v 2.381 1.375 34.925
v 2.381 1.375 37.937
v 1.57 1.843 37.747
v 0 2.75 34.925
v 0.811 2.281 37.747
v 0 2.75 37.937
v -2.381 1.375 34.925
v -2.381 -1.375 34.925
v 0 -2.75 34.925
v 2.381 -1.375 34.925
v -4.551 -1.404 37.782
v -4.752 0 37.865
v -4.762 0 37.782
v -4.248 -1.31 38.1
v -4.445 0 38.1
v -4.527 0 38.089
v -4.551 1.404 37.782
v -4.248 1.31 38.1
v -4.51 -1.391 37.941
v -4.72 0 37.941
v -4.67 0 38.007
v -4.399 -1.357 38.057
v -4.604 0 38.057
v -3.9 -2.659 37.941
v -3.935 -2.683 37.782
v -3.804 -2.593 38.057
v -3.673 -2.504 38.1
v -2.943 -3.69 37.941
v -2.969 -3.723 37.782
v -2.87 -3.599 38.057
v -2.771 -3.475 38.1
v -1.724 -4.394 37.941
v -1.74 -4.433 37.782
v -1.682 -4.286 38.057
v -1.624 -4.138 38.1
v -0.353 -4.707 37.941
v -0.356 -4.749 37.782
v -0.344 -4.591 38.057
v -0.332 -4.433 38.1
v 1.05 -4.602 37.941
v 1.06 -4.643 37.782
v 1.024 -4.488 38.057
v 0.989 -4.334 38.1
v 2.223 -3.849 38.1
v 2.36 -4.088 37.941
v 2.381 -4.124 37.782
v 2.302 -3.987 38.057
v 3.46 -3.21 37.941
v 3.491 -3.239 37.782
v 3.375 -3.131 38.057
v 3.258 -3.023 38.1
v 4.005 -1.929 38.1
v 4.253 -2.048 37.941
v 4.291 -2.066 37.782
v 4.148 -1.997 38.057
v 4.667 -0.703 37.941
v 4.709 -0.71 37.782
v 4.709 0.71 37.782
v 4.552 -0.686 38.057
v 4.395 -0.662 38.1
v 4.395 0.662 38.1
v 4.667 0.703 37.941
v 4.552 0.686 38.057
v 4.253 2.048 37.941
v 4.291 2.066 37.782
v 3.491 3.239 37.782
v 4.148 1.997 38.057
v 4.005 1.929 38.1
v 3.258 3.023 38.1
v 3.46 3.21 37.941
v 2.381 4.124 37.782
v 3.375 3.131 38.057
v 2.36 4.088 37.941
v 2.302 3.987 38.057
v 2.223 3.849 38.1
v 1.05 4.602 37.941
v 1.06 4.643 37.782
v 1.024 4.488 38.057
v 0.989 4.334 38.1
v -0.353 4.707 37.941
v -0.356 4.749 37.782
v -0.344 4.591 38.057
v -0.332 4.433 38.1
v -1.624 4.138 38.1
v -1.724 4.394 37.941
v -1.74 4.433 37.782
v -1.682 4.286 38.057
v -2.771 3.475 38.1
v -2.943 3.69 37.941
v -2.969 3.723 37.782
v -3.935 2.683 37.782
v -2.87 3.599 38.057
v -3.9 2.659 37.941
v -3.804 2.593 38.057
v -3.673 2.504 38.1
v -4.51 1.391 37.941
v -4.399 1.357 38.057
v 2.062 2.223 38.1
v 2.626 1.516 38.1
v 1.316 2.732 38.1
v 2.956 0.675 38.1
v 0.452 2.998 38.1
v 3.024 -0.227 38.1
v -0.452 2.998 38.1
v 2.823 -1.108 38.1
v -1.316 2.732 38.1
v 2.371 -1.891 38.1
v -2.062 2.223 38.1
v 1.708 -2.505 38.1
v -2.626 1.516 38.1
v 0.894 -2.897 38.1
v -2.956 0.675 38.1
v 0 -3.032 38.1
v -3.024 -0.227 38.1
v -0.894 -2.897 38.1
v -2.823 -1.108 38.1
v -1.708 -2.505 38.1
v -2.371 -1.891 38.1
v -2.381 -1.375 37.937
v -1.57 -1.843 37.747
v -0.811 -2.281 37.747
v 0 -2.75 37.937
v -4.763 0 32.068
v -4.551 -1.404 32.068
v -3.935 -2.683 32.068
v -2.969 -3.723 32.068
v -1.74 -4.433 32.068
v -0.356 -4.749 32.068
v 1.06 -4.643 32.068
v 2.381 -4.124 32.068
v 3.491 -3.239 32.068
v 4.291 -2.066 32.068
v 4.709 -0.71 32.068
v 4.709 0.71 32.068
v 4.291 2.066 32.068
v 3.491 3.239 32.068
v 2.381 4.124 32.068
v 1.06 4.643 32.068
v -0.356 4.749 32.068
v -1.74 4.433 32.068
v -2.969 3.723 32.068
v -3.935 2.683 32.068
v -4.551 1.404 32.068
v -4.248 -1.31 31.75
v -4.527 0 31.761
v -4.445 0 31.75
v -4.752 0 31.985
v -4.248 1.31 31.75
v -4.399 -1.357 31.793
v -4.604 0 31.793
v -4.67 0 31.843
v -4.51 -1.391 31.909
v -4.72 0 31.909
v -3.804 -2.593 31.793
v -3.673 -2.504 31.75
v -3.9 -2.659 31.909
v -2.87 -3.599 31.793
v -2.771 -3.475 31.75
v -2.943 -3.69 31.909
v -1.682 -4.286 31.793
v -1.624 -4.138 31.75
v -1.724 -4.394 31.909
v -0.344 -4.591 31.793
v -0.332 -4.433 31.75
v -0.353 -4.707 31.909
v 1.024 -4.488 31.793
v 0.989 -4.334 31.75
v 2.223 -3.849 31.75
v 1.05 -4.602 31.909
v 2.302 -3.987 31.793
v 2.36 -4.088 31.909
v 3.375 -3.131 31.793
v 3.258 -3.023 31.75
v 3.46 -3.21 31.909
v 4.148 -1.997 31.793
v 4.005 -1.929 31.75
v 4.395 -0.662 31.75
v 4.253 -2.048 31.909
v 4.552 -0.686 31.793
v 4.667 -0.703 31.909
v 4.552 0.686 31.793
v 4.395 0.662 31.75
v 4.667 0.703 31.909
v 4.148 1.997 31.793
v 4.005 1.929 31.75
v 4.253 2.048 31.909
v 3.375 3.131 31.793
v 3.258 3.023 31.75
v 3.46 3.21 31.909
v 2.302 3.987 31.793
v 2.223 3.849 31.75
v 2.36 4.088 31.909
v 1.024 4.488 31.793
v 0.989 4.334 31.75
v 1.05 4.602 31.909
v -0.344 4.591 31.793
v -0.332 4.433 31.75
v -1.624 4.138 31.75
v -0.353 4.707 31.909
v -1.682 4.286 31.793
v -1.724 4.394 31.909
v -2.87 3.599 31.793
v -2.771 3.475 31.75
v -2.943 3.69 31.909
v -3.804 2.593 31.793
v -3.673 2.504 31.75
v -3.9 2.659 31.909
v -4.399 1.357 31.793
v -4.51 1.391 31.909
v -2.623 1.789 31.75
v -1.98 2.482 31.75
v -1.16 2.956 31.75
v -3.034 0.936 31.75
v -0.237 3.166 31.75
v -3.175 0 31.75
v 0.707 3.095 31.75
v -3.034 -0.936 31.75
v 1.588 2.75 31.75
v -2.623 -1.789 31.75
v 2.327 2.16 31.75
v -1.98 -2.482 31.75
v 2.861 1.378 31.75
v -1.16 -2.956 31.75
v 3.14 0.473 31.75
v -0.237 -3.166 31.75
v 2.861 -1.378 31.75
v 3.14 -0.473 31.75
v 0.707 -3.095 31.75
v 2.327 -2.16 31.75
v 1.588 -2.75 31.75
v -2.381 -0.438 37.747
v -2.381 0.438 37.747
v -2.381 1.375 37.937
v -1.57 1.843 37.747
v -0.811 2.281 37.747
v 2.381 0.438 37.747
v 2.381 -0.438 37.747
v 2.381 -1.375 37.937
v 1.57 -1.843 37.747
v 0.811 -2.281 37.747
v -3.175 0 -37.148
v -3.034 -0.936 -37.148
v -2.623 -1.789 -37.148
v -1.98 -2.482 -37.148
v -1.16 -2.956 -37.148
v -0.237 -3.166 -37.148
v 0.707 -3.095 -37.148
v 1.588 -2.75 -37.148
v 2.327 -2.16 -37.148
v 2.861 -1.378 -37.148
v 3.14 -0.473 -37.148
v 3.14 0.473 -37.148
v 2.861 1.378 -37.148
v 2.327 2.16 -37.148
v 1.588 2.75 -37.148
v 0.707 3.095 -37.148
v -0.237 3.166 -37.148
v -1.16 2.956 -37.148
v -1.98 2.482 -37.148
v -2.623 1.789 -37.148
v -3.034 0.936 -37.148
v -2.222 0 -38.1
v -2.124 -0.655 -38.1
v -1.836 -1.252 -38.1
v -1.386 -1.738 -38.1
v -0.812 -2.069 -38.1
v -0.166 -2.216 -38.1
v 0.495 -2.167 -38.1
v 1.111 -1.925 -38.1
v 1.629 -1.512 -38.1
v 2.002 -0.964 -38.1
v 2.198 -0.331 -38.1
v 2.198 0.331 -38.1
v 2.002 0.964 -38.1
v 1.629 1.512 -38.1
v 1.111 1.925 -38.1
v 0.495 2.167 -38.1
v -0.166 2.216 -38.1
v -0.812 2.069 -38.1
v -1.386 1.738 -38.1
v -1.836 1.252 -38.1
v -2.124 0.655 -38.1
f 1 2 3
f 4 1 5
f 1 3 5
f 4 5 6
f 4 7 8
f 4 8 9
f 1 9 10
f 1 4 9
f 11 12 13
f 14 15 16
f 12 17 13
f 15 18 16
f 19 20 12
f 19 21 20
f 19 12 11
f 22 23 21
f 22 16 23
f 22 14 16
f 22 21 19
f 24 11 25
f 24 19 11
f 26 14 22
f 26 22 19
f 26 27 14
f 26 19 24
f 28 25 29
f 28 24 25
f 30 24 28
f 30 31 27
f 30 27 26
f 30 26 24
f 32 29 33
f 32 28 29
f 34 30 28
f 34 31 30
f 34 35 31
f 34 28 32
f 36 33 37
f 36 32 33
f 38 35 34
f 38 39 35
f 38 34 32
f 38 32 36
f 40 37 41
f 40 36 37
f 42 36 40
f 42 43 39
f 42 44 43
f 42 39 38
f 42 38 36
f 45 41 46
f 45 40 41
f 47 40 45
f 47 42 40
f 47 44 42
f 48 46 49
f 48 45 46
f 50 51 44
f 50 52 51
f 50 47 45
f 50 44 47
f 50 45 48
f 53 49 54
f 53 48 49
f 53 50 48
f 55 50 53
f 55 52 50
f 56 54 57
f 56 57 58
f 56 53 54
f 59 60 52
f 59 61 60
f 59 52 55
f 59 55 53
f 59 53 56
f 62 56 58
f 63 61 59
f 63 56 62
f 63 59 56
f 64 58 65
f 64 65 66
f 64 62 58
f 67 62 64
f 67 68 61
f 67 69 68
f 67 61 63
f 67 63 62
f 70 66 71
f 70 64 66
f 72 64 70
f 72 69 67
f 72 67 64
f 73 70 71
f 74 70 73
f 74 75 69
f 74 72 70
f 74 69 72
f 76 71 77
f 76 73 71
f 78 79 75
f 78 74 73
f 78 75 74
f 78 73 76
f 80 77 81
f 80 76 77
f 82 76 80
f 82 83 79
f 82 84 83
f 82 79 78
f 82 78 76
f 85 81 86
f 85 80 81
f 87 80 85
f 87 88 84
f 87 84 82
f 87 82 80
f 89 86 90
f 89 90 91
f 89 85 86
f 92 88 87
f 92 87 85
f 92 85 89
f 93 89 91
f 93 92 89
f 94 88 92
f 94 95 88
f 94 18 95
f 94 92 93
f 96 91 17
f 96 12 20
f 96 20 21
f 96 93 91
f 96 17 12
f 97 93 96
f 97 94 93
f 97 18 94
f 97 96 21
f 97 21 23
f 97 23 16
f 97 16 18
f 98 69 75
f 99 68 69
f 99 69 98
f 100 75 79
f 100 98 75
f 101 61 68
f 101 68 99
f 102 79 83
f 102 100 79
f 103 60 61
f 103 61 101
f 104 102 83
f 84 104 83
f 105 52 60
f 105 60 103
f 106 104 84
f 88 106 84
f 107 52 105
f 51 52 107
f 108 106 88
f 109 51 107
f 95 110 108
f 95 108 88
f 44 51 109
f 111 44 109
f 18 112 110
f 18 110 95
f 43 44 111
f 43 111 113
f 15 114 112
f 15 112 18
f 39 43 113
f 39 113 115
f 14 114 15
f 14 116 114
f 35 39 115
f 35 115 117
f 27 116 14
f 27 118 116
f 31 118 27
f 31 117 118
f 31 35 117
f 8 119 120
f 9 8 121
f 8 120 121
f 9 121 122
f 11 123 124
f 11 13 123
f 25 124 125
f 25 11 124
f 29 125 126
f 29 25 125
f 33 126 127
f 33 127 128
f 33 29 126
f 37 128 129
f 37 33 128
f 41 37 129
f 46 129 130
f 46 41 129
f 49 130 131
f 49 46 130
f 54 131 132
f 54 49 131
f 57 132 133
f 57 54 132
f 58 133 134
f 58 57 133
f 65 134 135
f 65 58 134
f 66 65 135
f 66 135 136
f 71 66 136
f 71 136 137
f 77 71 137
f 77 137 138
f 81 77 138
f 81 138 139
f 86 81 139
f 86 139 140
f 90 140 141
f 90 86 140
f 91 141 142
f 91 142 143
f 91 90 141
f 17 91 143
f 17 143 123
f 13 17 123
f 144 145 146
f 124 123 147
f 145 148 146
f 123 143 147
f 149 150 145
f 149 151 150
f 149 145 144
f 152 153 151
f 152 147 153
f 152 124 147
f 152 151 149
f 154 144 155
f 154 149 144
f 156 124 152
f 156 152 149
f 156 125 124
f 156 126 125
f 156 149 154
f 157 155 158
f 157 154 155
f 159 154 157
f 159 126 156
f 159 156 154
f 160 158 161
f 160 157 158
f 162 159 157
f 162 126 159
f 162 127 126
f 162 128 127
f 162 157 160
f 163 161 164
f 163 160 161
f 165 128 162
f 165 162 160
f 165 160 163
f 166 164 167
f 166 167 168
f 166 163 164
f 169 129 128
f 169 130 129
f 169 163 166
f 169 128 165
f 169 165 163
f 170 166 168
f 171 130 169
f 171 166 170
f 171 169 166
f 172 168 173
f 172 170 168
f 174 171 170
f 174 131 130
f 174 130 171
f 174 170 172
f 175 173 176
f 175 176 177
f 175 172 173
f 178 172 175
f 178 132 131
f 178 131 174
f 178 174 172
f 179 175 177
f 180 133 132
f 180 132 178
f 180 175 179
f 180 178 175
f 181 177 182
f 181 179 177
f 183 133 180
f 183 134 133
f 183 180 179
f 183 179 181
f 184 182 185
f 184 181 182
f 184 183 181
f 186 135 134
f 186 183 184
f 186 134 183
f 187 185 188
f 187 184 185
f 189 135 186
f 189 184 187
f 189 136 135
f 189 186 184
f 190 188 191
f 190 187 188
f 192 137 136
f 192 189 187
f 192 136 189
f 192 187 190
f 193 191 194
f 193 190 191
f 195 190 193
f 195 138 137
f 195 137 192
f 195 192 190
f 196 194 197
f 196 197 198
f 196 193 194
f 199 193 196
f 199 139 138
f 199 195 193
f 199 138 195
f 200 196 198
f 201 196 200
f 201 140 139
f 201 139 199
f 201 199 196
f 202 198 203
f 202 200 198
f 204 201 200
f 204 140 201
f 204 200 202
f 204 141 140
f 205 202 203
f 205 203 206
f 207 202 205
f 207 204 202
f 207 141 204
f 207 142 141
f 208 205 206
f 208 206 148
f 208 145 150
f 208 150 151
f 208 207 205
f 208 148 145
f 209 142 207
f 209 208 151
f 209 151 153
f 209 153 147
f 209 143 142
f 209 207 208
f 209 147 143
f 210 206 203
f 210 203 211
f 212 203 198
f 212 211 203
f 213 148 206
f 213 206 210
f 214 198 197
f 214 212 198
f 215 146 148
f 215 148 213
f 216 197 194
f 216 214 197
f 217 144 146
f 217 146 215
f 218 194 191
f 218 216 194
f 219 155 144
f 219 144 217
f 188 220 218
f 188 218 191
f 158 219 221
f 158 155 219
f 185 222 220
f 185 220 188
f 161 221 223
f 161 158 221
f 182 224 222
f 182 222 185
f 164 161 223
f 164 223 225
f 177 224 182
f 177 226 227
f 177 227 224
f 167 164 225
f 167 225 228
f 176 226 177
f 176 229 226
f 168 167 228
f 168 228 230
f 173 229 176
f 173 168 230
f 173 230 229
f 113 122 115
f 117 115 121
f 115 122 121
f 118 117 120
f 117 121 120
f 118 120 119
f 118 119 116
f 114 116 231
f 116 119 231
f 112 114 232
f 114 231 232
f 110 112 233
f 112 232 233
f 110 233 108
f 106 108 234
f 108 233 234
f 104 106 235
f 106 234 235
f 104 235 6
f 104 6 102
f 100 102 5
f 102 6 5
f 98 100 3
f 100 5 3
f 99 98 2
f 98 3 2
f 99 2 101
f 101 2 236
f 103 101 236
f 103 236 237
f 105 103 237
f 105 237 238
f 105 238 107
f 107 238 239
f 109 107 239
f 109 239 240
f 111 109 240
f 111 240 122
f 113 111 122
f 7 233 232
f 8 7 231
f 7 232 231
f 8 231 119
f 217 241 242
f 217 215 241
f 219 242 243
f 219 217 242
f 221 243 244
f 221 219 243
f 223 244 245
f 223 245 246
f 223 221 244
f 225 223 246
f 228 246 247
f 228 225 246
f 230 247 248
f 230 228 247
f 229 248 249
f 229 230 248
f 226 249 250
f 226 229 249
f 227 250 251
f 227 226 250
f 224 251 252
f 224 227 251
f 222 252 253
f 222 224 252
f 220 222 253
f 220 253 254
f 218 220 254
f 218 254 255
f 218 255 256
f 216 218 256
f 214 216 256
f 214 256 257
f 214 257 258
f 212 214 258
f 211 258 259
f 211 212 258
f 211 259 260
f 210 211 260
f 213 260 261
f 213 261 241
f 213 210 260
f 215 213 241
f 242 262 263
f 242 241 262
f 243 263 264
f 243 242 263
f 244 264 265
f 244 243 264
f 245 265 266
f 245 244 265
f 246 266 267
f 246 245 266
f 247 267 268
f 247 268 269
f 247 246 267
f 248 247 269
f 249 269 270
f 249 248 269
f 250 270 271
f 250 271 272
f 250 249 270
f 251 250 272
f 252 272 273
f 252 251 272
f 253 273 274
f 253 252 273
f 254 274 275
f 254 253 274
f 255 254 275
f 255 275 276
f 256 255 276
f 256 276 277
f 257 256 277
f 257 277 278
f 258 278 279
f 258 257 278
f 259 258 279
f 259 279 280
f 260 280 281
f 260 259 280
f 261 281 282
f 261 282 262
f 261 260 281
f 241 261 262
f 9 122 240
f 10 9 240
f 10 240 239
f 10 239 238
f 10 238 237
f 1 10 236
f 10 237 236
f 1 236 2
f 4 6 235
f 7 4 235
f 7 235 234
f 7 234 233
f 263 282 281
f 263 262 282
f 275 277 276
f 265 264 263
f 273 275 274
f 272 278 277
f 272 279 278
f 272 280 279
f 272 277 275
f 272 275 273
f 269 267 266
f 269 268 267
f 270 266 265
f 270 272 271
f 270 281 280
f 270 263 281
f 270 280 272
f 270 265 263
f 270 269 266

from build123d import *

# Parameters (mm, degrees)
CUT_EXTRUDE1_START = 38.1
CUT_EXTRUDE1_DEPTH = 3.175


with BuildPart() as part:
    # Sketch2 → Revolve1 (revolve)
    with BuildSketch(Plane(origin=(0, 0, 0), x_dir=(0, 0, -1), z_dir=(1, 0, 0)), mode=Mode.PRIVATE) as revolve1_sk:
        with BuildLine():
            Line((38.1, 0), (38.1, 2.2225))
            Line((38.1, 2.2225), (37.1475, 3.175))
            Line((37.1475, 3.175), (-31.75, 3.175))
            Line((-31.75, 3.175), (-31.75, 4.445))
            ThreePointArc((-31.75, 4.445), (-31.842993597, 4.669506403), (-32.0675, 4.7625))
            Line((-32.0675, 4.7625), (-37.7825, 4.7625))
            ThreePointArc((-37.7825, 4.7625), (-38.007006403, 4.669506403), (-38.1, 4.445))
            Line((-38.1, 4.445), (-38.1, 0))
            Line((-38.1, 0), (38.1, 0))
        make_face()
    revolve(revolve1_sk.sketch.rotate(Axis((0, 0, -38.1), (0, 0, 1)), 90), axis=Axis((0, 0, -38.1), (0, 0, 1)))

    # Sketch3 → Cut-Extrude1 (cut)
    with BuildSketch(Plane.XY.offset(CUT_EXTRUDE1_START)):
        Polygon((-2.38125, 1.374815329), (-2.38125, -1.374815329), (0, -2.749630657), (2.38125, -1.374815329), (2.38125, 1.374815329), (0, 2.749630657), align=None)
    extrude(amount=-CUT_EXTRUDE1_DEPTH, mode=Mode.SUBTRACT)

    # Cut-Extrude2 cone 1 section (through the dimple's axis) → Cut-Extrude2 (revolve, cut)
    with BuildSketch(Plane(origin=(0, 0, 38.1), x_dir=(0, -1, 0), z_dir=(1, 0, 0))):
        Polygon((0, 0), (3.032192214, 0), (0, 1.750636991), align=None)
    revolve(axis=Axis((0, 0, 38.1), (0, 0, -1)), mode=Mode.SUBTRACT)


solid = part.part
